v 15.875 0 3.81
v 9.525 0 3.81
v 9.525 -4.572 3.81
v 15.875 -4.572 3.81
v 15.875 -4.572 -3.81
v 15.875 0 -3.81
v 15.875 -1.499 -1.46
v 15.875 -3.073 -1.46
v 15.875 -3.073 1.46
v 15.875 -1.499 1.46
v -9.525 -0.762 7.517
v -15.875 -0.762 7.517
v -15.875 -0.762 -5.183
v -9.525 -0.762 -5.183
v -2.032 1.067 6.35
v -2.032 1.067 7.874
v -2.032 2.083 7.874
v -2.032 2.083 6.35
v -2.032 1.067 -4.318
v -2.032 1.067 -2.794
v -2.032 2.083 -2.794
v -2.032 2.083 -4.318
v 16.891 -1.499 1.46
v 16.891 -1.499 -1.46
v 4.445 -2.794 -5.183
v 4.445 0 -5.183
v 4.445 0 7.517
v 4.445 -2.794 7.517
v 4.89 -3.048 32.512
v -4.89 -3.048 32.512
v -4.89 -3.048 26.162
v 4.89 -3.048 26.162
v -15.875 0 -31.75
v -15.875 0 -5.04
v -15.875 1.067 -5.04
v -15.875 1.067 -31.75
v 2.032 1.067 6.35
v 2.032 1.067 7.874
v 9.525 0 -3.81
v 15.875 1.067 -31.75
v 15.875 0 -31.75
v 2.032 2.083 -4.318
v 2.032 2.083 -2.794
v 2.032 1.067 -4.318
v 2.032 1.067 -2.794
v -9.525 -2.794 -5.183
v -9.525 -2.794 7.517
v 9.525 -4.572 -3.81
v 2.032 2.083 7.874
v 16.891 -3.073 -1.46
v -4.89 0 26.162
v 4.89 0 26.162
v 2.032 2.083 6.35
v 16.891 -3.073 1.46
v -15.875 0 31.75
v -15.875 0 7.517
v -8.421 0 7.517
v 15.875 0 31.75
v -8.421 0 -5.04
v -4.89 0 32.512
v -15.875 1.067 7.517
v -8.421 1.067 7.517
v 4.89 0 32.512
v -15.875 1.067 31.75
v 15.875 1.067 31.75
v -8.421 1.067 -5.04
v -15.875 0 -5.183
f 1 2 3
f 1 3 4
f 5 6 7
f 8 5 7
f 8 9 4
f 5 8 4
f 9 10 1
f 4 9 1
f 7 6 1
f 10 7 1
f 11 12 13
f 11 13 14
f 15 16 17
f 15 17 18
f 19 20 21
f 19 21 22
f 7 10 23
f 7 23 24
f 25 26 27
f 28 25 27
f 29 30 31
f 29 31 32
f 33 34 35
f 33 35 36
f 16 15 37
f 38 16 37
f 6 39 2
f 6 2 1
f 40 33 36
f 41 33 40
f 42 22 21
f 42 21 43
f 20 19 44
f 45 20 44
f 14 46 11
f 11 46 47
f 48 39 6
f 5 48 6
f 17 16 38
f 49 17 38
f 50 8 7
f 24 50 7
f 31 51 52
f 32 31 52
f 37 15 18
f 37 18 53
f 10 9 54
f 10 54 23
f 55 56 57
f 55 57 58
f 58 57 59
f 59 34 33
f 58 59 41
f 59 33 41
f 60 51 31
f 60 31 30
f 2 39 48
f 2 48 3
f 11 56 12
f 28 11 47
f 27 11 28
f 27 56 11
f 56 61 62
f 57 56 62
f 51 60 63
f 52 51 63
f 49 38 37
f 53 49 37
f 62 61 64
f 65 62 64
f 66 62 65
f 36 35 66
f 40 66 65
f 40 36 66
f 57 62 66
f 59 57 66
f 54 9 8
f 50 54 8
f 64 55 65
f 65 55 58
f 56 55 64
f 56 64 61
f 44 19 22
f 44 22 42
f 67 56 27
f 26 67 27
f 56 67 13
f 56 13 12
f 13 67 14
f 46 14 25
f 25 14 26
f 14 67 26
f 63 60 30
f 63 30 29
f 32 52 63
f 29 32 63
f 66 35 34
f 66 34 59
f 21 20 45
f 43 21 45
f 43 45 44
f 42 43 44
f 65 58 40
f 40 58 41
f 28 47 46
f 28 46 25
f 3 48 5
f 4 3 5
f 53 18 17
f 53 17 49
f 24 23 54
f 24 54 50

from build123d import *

# Parameters (mm, degrees)
SKETCH1_W             = 31.75
SKETCH1_H             = 63.5
BAREBOARD_DEPTH       = 1.0668
SKETCH2_W             = 9.779
SKETCH2_H             = 6.35
USB_DEPTH             = 3.048
SKETCH3_W             = 4.064
SKETCH3_H             = 1.524
SIDEFIRE_LEDS_DEPTH   = 1.016
SIDEFIRE_LEDS_2_DEPTH = 1.016
SKETCH4_W             = 20.32
SKETCH4_H             = 12.7
BLE_RADIO_DEPTH       = 2.794
SKETCH5_W             = 6.35
SKETCH5_H             = 12.7
CUT_BLE1_DEPTH        = 2.032
SKETCH6_W             = 12.7
SKETCH6_H             = 12.556872392
CUT_BLE2_DEPTH        = 1.0668
SKETCH7_W             = 6.35
SKETCH7_H             = 7.62
SWITCHBASE_DEPTH      = 4.572
SKETCH8_W             = 2.921
SKETCH8_H             = 1.5748
BUTTONSWITCH_DEPTH    = 1.016


with BuildPart() as part:
    # Sketch1 → BareBoard (new body)
    with BuildSketch(Plane(origin=(0, 0, 0), x_dir=(1, 0, 0), z_dir=(0, 1, 0))):
        Rectangle(SKETCH1_W, SKETCH1_H)
    extrude(amount=BAREBOARD_DEPTH)

    # Sketch6 → Cut-BLE2 (cut)
    with BuildSketch(Plane(origin=(0, 1.0668, 0), x_dir=(1, 0, 0), z_dir=(0, 1, 0))):
        with Locations((-14.770961261, -1.238442872)):
            Rectangle(SKETCH6_W, SKETCH6_H)
    extrude(amount=-CUT_BLE2_DEPTH, mode=Mode.SUBTRACT)


with BuildPart() as body_2:
    # Sketch2 → USB (new body)
    with BuildSketch(Plane.XZ):
        with Locations((0, 29.337)):
            Rectangle(SKETCH2_W, SKETCH2_H)
    extrude(amount=USB_DEPTH)


with BuildPart() as body_3:
    # Sketch3 → SideFire LEDs (new body)
    with BuildSketch(Plane(origin=(0, 1.0668, 0), x_dir=(1, 0, 0), z_dir=(0, 1, 0))):
        with Locations((0, 3.556)):
            Rectangle(SKETCH3_W, SKETCH3_H)
    extrude(amount=SIDEFIRE_LEDS_DEPTH)


with BuildPart() as body_4:
    # Sketch3 → SideFire LEDs 2 (new body)
    with BuildSketch(Plane(origin=(0, 1.0668, 0), x_dir=(1, 0, 0), z_dir=(0, 1, 0))):
        with Locations((0, -7.112)):
            Rectangle(SKETCH3_W, SKETCH3_H)
    extrude(amount=SIDEFIRE_LEDS_2_DEPTH)


with BuildPart() as body_5:
    # Sketch4 → BLE Radio (new body)
    with BuildSketch(Plane.XZ):
        with Locations((-5.715, 1.166879068)):
            Rectangle(SKETCH4_W, SKETCH4_H)
    extrude(amount=BLE_RADIO_DEPTH)

    # Sketch5 → Cut-BLE1 (cut)
    with BuildSketch(Plane.XZ.offset(2.794)):
        with Locations((-12.7, 1.166879068)):
            Rectangle(SKETCH5_W, SKETCH5_H)
    extrude(amount=-CUT_BLE1_DEPTH, mode=Mode.SUBTRACT)


with BuildPart() as body_6:
    # Sketch7 → SwitchBase (new body)
    with BuildSketch(Plane.XZ):
        with Locations((12.7, 0)):
            Rectangle(SKETCH7_W, SKETCH7_H)
    extrude(amount=SWITCHBASE_DEPTH)

    # Sketch8 → ButtonSwitch (add)
    with BuildSketch(Plane(origin=(15.875, 0, 0), x_dir=(0, 0, -1), z_dir=(1, 0, 0))):
        with Locations((0, -2.286)):
            Rectangle(SKETCH8_W, SKETCH8_H)
    extrude(amount=BUTTONSWITCH_DEPTH)


solid = Compound([part.part, body_2.part, body_3.part, body_4.part, body_5.part, body_6.part])
